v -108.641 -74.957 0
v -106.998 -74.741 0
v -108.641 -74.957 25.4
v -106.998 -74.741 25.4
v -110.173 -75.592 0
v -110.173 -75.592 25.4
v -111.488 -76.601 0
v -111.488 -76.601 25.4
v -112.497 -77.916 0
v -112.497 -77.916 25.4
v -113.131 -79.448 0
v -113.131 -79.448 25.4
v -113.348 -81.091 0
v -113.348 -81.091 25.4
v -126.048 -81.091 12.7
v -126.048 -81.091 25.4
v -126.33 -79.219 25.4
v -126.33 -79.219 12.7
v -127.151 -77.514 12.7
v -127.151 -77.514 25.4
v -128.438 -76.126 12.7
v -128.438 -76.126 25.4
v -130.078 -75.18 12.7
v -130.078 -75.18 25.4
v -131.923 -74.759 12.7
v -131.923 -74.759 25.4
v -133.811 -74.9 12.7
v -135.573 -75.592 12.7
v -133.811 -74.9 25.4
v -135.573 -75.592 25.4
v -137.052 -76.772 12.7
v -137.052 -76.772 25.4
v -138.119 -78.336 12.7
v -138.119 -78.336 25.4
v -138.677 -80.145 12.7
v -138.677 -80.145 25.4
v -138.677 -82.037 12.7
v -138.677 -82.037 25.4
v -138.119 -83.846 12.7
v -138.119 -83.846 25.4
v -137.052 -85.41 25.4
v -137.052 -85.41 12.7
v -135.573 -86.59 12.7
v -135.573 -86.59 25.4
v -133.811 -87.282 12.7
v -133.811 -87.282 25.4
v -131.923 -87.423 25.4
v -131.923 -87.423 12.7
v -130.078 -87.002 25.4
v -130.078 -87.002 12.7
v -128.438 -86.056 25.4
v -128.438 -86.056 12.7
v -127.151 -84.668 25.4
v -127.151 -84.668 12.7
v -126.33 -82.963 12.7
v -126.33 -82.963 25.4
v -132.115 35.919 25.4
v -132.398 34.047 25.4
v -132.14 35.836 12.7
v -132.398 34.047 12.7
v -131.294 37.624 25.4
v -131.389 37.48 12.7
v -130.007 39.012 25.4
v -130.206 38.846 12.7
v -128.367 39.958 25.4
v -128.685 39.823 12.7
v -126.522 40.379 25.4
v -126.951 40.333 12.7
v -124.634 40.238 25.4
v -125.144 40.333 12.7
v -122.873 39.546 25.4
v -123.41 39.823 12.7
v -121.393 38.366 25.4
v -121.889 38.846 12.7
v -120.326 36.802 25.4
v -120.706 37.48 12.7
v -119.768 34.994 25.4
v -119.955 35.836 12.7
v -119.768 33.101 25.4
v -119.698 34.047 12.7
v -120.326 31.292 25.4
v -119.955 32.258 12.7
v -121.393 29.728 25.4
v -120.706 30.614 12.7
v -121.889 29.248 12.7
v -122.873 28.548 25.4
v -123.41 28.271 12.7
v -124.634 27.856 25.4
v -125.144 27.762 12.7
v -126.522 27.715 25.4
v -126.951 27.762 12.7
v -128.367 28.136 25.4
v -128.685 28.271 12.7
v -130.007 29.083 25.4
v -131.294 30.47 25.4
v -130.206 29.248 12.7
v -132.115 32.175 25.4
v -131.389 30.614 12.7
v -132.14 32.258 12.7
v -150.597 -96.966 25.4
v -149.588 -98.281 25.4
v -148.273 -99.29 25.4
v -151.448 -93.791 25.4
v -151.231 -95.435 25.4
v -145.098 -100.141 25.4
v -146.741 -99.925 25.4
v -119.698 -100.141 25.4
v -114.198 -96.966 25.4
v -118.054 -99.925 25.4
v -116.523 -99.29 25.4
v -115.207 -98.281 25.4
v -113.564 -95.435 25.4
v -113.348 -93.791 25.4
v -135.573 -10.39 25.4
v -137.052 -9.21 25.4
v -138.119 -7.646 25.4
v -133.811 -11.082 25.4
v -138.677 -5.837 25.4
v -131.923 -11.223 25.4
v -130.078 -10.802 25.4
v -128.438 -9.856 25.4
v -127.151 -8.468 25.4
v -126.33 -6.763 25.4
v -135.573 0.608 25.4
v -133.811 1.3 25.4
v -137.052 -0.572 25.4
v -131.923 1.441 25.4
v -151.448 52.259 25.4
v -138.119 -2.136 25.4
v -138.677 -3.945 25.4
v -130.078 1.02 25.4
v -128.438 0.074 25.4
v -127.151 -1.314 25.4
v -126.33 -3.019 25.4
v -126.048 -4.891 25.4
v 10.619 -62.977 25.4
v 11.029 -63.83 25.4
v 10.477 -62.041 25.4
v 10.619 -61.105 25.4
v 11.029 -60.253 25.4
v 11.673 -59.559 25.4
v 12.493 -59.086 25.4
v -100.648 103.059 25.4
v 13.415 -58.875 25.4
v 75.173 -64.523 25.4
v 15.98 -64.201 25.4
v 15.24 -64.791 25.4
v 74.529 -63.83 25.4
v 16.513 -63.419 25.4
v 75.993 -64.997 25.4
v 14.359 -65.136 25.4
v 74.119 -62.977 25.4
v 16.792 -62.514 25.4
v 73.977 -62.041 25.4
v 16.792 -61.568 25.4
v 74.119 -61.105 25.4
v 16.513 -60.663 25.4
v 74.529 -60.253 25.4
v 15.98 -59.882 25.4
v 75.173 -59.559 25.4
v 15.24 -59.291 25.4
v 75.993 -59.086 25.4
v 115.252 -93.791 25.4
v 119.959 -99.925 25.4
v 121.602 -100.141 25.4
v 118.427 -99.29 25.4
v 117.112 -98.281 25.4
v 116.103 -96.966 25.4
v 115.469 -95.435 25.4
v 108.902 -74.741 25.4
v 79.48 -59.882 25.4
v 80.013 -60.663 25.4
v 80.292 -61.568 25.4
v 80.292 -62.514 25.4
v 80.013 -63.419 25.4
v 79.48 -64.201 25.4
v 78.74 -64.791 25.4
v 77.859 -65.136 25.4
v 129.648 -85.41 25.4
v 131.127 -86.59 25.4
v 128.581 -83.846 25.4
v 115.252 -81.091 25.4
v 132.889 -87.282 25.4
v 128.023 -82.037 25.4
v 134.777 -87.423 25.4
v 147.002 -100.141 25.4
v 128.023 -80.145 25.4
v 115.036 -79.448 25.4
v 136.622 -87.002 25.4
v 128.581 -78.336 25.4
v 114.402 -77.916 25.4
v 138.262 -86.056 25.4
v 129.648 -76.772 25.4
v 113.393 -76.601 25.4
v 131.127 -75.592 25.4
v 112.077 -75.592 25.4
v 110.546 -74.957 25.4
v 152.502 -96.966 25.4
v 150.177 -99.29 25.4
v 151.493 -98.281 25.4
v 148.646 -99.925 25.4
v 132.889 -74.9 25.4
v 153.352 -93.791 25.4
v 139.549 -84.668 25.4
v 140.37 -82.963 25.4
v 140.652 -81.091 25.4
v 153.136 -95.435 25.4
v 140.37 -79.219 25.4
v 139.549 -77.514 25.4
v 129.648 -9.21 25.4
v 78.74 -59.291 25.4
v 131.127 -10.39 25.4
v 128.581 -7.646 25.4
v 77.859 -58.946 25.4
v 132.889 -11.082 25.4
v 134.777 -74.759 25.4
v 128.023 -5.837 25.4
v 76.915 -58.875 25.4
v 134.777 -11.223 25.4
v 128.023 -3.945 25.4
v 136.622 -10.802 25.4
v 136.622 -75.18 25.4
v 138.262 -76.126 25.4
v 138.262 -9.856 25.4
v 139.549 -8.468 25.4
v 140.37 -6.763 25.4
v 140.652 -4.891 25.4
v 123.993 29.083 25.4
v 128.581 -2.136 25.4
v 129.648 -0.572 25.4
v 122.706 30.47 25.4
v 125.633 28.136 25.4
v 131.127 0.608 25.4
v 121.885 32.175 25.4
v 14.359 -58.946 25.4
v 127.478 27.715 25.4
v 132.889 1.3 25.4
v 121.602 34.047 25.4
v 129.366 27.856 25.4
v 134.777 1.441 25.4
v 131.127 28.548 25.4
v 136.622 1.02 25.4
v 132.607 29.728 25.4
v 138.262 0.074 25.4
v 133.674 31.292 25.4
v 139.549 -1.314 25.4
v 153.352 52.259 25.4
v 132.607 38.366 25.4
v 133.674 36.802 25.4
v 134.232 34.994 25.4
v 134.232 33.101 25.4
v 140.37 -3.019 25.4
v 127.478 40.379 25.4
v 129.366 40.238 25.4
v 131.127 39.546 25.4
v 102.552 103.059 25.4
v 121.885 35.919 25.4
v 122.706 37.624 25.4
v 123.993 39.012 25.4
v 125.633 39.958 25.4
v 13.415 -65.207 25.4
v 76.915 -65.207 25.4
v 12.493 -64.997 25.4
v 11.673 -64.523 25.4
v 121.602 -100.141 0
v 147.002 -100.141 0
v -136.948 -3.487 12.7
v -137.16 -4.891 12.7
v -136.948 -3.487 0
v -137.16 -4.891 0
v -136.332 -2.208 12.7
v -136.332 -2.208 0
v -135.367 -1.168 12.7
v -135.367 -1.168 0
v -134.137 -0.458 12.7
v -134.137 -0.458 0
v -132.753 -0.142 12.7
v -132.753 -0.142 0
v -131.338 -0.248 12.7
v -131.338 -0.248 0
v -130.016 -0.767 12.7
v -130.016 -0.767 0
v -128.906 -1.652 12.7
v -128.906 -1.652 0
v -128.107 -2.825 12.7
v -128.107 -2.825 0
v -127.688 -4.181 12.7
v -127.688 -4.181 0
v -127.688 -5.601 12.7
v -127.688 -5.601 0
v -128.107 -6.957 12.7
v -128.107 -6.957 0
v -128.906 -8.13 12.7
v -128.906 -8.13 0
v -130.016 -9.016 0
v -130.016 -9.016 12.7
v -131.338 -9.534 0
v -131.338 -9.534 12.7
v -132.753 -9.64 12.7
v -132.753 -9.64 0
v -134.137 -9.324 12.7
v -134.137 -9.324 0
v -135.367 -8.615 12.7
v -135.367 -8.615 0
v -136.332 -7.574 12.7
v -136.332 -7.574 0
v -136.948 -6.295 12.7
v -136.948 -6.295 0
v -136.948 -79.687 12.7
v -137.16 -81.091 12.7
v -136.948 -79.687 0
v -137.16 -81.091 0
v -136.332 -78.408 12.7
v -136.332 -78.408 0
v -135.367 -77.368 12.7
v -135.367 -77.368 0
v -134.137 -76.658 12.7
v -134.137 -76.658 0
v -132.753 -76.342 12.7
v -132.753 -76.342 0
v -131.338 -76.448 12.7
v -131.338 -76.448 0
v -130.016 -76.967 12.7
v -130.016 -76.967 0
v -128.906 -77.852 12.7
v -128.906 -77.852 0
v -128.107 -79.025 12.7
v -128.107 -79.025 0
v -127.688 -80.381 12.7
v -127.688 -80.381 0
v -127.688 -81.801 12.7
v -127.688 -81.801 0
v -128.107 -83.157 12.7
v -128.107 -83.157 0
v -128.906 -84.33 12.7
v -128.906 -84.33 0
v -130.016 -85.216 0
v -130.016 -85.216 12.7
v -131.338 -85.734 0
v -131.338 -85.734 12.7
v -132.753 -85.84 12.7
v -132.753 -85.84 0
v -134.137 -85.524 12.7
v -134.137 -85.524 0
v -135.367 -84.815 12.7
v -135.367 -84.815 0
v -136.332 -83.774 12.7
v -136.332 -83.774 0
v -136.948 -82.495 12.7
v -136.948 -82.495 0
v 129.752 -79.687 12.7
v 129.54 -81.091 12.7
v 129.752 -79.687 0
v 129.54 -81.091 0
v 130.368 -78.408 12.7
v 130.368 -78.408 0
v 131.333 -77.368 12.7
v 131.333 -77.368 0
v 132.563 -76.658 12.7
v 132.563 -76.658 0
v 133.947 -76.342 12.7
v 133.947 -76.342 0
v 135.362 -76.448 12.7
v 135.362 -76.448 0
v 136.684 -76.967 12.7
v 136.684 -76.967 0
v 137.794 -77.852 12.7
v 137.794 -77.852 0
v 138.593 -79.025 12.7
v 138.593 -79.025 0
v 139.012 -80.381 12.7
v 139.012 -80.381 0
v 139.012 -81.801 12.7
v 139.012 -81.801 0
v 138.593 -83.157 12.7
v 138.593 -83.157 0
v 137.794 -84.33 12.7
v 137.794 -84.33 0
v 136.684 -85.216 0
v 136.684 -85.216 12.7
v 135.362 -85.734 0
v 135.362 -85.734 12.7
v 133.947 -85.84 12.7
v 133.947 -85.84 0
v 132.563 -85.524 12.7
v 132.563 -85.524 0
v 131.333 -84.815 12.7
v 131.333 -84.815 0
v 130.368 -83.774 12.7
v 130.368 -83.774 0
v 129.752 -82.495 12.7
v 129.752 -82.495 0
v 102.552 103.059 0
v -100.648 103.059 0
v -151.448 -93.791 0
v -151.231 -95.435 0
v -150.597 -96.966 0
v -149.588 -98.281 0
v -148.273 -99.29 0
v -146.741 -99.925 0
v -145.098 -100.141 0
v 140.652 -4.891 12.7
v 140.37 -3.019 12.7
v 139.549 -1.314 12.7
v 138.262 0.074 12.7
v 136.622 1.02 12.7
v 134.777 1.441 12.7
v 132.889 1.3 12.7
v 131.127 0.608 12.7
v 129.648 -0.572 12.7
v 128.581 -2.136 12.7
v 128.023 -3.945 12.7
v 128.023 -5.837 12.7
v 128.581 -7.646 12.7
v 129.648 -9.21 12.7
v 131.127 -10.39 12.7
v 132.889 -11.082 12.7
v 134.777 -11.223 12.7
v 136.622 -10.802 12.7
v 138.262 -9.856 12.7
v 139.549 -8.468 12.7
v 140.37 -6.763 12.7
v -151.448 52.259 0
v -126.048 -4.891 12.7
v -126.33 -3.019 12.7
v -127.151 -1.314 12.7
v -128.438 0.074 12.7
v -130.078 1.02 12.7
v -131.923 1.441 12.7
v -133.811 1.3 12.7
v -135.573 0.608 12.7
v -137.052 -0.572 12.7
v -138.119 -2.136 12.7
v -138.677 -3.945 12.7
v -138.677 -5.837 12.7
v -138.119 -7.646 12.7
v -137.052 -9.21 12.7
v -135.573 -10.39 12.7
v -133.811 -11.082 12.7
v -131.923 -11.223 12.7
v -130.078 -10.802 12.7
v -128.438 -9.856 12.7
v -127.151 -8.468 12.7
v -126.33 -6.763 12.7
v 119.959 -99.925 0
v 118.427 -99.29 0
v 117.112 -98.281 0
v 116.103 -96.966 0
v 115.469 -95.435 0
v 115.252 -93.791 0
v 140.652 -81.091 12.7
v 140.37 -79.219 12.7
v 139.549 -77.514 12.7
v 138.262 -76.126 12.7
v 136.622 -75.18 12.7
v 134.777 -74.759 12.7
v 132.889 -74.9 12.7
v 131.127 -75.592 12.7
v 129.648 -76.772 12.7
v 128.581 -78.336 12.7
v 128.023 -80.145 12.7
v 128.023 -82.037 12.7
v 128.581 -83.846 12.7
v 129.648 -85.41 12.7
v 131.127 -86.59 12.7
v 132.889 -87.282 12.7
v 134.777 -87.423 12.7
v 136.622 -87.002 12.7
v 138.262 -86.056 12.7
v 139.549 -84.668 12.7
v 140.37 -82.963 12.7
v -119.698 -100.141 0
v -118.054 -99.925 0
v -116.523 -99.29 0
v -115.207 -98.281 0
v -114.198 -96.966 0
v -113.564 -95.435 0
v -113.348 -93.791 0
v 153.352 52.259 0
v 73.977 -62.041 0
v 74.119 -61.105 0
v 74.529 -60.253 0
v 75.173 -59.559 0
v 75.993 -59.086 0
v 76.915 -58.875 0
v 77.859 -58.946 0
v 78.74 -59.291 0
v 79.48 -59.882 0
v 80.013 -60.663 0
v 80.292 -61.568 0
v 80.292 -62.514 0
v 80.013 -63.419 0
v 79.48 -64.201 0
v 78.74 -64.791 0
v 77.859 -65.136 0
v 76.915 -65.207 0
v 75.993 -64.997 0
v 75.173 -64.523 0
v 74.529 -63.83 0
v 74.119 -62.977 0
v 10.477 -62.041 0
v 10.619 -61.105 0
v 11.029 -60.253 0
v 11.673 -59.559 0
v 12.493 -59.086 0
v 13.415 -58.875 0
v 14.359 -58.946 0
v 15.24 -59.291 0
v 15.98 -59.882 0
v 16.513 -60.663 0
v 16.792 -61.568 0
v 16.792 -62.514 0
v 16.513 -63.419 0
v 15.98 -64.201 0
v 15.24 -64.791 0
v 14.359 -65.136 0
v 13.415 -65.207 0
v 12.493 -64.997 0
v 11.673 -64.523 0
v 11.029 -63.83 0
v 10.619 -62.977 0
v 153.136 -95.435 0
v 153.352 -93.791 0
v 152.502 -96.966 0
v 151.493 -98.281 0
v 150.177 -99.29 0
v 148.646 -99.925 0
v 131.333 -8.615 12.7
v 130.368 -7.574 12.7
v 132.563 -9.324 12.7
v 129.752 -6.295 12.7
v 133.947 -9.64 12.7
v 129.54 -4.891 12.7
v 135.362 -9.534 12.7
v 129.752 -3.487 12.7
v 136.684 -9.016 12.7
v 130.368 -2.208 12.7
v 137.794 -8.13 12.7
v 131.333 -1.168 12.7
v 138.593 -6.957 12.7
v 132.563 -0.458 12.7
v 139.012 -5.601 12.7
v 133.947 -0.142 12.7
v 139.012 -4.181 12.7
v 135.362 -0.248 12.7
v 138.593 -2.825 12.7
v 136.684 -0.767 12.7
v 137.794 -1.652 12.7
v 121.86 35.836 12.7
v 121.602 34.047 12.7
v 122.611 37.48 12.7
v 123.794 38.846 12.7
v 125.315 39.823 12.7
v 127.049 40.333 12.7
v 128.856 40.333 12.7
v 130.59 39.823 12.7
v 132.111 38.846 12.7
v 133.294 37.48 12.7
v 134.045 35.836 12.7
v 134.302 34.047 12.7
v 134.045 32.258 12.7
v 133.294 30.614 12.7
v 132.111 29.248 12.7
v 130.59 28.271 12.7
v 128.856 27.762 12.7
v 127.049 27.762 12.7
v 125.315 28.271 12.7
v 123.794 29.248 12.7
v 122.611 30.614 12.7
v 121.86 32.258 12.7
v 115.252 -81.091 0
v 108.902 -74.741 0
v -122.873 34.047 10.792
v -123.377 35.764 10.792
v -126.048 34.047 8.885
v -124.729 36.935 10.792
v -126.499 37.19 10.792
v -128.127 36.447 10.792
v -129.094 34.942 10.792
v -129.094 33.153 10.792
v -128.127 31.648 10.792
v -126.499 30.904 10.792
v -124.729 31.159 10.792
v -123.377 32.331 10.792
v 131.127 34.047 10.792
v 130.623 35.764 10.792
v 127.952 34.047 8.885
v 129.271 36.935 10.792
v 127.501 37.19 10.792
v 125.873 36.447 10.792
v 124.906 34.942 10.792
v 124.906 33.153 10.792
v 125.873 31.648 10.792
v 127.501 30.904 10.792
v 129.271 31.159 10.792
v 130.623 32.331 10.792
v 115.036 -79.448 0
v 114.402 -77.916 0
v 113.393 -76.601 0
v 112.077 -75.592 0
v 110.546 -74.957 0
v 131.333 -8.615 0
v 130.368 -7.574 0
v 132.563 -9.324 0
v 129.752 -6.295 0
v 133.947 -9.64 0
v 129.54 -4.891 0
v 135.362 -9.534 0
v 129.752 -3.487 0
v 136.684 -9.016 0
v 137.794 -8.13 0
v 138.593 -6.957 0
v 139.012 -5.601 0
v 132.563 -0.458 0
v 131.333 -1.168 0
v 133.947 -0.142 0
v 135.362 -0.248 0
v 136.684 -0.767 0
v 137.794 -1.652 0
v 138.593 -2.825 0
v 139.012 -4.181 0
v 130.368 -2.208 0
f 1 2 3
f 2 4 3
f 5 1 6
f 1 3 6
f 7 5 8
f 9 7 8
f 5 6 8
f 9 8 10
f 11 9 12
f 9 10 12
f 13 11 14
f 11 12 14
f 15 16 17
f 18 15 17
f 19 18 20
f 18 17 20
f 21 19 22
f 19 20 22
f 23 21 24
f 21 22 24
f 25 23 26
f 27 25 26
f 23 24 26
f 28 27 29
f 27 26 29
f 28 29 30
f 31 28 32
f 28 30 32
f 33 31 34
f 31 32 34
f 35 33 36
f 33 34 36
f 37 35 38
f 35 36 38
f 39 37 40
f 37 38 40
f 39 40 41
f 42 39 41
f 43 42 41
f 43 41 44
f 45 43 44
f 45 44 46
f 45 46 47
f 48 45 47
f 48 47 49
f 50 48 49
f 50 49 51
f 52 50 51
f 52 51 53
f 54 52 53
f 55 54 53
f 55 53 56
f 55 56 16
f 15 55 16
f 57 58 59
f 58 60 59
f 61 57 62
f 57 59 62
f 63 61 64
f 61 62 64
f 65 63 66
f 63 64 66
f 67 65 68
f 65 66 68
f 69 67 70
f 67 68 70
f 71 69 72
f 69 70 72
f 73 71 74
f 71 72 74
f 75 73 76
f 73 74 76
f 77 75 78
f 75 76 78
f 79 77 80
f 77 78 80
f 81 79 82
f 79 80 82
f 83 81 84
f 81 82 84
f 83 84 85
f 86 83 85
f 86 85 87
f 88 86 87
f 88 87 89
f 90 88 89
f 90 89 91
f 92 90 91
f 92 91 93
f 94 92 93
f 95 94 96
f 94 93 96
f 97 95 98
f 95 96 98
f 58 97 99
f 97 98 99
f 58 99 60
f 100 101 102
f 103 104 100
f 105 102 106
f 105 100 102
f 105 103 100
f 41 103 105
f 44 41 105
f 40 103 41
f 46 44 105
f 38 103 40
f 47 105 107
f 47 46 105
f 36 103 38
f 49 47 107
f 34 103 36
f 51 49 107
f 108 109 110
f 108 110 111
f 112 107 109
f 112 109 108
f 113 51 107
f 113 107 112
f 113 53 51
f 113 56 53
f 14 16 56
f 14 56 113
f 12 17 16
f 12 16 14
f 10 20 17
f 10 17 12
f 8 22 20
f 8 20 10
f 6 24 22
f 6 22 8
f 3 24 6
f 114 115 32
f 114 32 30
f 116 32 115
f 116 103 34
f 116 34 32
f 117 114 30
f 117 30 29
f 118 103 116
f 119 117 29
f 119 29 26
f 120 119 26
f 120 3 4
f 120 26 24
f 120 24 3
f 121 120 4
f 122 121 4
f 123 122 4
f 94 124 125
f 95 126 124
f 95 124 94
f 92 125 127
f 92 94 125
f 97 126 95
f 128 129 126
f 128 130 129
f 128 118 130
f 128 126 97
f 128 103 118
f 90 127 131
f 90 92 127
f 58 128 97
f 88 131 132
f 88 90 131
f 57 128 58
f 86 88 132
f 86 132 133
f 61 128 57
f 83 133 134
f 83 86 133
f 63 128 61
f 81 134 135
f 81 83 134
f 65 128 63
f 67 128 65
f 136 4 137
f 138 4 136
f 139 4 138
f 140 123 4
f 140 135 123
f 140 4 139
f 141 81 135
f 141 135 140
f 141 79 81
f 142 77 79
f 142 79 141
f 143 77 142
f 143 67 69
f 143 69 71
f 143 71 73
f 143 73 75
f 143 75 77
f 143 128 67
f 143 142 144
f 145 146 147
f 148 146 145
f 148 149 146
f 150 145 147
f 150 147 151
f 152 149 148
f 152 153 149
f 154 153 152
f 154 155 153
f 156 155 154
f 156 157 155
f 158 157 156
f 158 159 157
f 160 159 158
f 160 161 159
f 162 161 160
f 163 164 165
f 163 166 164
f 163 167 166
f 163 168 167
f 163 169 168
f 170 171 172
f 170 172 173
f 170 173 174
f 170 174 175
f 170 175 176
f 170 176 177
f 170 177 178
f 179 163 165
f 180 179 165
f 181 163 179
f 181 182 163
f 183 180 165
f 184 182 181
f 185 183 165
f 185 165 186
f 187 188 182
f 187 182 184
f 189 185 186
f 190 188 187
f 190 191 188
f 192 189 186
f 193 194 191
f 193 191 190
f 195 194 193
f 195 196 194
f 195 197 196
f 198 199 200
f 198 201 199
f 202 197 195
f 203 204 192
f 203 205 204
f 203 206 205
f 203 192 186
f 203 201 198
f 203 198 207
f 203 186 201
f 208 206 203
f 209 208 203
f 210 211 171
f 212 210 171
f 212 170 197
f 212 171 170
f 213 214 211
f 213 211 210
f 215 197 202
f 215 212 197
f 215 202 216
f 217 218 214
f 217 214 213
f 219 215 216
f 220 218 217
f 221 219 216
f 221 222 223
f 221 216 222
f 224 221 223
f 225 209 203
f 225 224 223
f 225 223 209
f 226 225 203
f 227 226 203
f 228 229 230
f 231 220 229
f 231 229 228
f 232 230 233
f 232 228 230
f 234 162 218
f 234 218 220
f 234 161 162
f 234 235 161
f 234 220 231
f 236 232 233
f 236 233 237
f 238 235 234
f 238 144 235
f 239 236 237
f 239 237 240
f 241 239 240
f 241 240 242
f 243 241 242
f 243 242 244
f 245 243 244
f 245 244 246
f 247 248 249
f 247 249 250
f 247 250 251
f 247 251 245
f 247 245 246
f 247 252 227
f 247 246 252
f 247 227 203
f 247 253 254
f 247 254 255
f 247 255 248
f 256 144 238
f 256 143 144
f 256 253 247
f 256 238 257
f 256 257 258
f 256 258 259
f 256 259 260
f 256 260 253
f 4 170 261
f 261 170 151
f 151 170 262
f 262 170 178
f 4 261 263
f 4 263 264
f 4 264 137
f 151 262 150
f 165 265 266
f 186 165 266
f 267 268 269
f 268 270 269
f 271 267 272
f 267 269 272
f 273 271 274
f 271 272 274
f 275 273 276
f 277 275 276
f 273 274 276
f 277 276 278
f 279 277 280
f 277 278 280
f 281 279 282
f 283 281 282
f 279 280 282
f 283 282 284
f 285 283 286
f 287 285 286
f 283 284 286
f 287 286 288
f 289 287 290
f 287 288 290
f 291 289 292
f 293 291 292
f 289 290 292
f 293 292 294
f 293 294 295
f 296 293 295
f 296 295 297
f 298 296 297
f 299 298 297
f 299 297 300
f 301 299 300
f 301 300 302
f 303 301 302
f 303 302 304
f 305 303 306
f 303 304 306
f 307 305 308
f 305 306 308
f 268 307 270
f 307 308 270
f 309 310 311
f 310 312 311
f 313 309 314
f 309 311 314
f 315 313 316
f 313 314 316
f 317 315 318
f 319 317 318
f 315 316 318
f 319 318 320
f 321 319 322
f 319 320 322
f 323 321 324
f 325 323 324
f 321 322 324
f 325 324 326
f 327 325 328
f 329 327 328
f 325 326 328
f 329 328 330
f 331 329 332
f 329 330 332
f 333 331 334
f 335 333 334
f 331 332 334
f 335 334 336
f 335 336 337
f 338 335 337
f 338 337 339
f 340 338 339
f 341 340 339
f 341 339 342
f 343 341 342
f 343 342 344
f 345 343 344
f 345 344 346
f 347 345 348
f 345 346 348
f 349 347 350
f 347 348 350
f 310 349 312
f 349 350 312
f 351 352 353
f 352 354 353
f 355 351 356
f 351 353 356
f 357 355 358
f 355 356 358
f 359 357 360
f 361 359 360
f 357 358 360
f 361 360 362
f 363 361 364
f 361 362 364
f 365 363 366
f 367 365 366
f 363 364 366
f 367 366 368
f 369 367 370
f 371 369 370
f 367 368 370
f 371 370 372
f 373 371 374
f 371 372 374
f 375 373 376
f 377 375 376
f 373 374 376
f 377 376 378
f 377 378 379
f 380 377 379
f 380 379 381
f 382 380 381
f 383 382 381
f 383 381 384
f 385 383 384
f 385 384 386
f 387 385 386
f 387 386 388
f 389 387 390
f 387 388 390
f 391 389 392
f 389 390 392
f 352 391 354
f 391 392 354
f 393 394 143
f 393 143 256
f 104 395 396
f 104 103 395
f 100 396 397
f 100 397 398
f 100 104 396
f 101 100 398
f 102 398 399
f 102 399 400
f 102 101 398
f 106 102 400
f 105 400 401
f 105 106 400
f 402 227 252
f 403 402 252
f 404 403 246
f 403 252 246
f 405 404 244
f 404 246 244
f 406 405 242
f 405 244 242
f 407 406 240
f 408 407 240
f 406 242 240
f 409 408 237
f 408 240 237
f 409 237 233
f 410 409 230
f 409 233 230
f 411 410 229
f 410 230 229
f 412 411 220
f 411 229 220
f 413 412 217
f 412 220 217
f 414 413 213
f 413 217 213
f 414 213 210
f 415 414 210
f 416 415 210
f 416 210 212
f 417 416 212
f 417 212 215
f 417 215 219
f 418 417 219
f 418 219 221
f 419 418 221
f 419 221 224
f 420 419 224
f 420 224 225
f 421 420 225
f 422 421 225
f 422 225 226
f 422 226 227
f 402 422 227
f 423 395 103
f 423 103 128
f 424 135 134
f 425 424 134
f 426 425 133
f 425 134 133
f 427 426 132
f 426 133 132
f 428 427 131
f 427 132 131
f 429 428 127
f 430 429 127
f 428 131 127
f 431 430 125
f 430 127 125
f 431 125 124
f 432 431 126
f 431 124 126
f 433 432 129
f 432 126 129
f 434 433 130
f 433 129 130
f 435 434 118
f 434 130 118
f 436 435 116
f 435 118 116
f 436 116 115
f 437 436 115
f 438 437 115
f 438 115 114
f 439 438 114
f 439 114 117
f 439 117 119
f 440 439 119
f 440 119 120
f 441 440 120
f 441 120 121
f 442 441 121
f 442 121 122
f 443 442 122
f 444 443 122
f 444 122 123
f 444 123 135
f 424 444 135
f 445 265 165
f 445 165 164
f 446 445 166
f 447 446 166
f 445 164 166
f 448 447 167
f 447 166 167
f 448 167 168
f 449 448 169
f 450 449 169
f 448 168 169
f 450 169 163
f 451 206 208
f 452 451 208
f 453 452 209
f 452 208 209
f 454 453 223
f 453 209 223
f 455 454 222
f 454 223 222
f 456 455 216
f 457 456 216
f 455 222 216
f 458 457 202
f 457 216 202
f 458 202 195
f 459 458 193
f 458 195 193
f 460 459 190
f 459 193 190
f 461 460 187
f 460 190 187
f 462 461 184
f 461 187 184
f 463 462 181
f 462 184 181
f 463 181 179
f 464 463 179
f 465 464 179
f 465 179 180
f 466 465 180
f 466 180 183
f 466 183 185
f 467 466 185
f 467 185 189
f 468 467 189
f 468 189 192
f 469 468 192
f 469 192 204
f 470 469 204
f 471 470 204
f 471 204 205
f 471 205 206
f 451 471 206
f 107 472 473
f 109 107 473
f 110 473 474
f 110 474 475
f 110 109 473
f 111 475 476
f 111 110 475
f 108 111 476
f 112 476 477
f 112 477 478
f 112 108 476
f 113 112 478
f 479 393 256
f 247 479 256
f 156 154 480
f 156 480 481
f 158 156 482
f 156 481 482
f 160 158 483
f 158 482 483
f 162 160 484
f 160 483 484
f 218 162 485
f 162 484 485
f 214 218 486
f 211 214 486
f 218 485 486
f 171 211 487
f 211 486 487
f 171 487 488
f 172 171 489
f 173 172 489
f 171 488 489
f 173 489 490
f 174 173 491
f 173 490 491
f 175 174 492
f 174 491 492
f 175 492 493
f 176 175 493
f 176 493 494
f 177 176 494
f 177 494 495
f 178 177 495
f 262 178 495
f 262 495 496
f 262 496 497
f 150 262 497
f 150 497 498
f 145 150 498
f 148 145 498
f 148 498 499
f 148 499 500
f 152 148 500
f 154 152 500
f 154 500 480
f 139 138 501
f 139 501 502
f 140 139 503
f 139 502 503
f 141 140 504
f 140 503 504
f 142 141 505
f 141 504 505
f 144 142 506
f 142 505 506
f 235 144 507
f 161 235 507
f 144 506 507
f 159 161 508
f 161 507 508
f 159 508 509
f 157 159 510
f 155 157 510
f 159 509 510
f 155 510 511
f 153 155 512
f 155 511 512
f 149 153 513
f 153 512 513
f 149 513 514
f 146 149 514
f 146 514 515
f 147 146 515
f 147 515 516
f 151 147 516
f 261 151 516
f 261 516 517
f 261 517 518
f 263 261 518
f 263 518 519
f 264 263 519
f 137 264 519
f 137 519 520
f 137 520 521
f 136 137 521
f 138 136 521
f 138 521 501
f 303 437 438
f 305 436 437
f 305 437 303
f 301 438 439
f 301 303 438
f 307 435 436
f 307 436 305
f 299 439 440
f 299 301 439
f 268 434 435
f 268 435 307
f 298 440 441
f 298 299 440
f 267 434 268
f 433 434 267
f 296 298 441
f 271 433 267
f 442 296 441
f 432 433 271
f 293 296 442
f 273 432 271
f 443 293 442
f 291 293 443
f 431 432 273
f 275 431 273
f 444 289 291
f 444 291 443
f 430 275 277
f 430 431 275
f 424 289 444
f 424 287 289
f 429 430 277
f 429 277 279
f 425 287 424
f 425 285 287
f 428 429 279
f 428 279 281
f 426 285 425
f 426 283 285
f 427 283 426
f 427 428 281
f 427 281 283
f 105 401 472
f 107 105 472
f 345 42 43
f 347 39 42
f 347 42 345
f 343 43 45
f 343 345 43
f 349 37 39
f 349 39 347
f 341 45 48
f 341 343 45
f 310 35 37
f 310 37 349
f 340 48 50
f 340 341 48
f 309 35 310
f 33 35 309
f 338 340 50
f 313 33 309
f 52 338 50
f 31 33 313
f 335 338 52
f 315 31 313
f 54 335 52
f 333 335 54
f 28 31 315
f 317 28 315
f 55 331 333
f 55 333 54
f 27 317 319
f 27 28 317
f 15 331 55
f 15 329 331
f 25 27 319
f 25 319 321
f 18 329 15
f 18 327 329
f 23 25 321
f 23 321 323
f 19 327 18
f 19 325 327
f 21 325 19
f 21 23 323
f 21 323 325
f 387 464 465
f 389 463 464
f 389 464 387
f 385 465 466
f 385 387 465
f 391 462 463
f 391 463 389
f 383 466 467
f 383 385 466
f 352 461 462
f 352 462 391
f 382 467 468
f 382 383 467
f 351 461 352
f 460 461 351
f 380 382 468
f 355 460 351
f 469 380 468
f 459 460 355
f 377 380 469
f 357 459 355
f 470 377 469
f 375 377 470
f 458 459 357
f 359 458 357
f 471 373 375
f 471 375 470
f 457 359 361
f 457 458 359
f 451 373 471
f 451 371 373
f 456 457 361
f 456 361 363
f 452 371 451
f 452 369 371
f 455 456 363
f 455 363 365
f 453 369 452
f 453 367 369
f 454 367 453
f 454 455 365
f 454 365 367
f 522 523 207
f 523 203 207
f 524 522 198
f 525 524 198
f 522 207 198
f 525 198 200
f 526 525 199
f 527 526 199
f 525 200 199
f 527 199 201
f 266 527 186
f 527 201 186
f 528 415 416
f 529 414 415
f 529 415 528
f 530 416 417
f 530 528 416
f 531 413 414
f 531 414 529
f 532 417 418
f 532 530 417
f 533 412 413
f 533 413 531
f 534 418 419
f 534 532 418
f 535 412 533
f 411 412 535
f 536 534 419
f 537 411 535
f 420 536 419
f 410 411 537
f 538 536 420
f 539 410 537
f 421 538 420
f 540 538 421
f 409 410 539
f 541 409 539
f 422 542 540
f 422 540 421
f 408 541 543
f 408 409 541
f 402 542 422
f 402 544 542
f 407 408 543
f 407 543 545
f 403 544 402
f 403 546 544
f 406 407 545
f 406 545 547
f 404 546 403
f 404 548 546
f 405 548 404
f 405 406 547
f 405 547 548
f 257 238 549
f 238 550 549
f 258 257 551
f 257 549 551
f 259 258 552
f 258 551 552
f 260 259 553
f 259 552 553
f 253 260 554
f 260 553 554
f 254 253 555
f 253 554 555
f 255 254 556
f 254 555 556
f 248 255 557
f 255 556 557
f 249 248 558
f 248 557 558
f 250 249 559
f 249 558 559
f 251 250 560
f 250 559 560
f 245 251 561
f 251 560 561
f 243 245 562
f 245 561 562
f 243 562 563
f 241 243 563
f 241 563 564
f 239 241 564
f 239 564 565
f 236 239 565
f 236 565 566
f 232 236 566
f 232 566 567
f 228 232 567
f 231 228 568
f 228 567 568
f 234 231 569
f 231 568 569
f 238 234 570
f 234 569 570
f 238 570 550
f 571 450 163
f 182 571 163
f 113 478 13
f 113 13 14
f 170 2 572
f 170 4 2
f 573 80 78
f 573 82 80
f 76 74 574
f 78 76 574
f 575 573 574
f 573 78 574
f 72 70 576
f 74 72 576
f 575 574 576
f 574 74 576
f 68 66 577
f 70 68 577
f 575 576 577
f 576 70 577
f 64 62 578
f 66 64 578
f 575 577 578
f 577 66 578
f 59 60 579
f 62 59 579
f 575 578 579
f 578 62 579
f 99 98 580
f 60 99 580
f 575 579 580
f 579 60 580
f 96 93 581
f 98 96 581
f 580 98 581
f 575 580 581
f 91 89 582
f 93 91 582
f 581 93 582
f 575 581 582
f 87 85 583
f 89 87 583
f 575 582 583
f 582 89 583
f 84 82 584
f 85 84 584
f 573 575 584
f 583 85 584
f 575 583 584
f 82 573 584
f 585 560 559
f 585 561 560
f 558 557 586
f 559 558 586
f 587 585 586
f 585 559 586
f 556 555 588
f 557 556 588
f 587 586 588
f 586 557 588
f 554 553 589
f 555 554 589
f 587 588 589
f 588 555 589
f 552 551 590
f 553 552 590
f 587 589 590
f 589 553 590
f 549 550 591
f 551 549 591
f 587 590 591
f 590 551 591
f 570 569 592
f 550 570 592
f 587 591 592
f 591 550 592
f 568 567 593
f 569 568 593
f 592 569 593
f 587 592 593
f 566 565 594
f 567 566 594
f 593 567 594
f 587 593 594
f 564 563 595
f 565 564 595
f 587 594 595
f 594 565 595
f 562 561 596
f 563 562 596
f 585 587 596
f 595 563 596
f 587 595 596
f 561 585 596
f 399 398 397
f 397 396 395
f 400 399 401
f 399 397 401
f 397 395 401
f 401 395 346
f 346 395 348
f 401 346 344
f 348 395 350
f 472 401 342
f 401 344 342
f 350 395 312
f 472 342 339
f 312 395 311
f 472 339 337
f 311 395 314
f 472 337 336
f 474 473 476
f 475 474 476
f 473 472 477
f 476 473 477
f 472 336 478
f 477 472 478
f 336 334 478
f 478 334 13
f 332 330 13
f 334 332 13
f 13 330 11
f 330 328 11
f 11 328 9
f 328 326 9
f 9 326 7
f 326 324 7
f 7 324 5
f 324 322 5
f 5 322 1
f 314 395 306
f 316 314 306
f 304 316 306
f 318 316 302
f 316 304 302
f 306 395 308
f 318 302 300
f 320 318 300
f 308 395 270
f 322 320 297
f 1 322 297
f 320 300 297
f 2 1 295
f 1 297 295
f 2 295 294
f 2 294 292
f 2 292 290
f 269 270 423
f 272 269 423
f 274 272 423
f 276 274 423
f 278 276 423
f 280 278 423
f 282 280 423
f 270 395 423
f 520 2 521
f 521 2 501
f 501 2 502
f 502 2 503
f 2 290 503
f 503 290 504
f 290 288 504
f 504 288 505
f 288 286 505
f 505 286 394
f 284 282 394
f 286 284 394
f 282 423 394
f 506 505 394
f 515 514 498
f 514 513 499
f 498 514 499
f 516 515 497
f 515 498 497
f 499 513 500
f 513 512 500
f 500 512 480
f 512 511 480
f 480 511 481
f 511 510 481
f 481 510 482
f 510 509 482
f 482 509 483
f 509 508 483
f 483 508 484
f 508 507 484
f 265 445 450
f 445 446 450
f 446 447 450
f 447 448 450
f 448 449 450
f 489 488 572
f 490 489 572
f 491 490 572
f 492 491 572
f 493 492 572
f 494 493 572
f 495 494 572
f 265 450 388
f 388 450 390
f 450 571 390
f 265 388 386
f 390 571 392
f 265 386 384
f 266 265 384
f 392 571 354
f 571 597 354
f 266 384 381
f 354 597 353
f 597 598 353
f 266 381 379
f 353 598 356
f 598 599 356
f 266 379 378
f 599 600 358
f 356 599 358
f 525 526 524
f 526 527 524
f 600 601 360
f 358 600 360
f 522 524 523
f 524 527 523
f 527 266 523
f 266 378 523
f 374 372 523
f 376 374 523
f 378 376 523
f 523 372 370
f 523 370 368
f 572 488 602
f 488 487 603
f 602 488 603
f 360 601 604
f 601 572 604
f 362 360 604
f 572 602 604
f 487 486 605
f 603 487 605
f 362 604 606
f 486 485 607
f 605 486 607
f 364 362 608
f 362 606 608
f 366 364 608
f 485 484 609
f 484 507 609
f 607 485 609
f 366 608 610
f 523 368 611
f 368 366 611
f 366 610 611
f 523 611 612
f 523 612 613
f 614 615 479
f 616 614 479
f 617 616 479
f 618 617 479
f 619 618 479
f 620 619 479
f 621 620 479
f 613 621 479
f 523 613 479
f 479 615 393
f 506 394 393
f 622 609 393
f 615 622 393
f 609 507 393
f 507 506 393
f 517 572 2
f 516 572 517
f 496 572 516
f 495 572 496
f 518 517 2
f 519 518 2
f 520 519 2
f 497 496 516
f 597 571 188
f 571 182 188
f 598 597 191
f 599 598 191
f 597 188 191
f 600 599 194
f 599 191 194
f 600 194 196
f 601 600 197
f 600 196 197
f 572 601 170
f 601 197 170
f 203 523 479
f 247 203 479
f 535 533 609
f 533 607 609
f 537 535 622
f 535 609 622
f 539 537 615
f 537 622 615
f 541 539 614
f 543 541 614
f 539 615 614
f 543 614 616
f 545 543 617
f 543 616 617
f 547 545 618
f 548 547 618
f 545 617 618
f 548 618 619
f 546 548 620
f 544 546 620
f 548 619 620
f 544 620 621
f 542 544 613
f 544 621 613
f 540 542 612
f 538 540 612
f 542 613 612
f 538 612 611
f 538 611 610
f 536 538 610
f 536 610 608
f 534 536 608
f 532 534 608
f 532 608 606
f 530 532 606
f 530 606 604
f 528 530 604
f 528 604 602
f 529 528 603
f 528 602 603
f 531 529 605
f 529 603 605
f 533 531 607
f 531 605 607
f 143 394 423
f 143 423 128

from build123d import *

# Parameters (mm, degrees)
F0_W           = 304.8
F0_H           = 203.2
F1_DEPTH       = 25.4
F3_SIZE        = 50.8
F4_W           = 228.6
F4_H           = 25.4
F5_DEPTH       = 25.4
F6_R           = 6.35
F8_D           = 9.525
F8_CBORE_D     = 12.7
F8_CBORE_DEPTH = 12.7
F10_D          = 6.35
F12_D          = 12.7
F12_DEPTH      = 12.7
F12_TIP        = 3.8154649308


with BuildPart() as f1:
    # F0 (on Top) → F1 (new body)
    with BuildSketch(Plane.XY):
        with Locations((0.9524989873, 1.4589339421)):
            Rectangle(F0_W, F0_H)
    extrude(amount=F1_DEPTH)

    # F3
    f3_edges = [f1.edges().sort_by_distance(p)[0] for p in [
        (-151.447501, 103.058934, 12.7),
        (153.352499, 103.058934, 12.7),
    ]]
    chamfer(f3_edges, length=F3_SIZE)

    # F4 (on face) → F5 (cut)
    with BuildSketch(Plane.XZ.offset(100.1410660579)):
        with Locations((0.9524989873, 12.7)):
            Rectangle(F4_W, F4_H)
    extrude(amount=-F5_DEPTH, mode=Mode.SUBTRACT)

    # F6
    f6_edges = [f1.edges().sort_by_distance(p)[0] for p in [
        (-113.347501, -100.141066, 12.7),
        (-113.347501, -74.741066, 12.7),
        (115.252499, -74.741066, 12.7),
        (115.252499, -100.141066, 12.7),
        (153.352499, -100.141066, 12.7),
        (-151.447501, -100.141066, 12.7),
    ]]
    fillet(f6_edges, radius=F6_R)

    # F8 (through all)
    with Locations(Plane.XY.offset(25.4)):
        with Locations((-132.3975010127, -81.0910660579), (-132.3975010127, -4.8910660579), (134.3024989873, -4.8910660579), (134.3024989873, -81.0910660579)):
            CounterBoreHole(F8_D / 2, F8_CBORE_D / 2, F8_CBORE_DEPTH)

    # F10 (through all)
    with Locations(Plane.XY.offset(25.4)):
        with Locations((13.6524989873, -62.0410660579), (77.1524989873, -62.0410660579)):
            Hole(F10_D / 2)

    # F12
    with Locations(Plane.XY.offset(25.4)):
        with Locations((-126.0475010127, 34.0471339421), (127.9524989873, 34.0471339421)):
            Hole(F12_D / 2, depth=F12_DEPTH)
            with Locations((0, 0, -(F12_DEPTH + F12_TIP / 2))):  # 118° drill point
                Cone(0, F12_D / 2, F12_TIP, mode=Mode.SUBTRACT)


solid = f1.part
